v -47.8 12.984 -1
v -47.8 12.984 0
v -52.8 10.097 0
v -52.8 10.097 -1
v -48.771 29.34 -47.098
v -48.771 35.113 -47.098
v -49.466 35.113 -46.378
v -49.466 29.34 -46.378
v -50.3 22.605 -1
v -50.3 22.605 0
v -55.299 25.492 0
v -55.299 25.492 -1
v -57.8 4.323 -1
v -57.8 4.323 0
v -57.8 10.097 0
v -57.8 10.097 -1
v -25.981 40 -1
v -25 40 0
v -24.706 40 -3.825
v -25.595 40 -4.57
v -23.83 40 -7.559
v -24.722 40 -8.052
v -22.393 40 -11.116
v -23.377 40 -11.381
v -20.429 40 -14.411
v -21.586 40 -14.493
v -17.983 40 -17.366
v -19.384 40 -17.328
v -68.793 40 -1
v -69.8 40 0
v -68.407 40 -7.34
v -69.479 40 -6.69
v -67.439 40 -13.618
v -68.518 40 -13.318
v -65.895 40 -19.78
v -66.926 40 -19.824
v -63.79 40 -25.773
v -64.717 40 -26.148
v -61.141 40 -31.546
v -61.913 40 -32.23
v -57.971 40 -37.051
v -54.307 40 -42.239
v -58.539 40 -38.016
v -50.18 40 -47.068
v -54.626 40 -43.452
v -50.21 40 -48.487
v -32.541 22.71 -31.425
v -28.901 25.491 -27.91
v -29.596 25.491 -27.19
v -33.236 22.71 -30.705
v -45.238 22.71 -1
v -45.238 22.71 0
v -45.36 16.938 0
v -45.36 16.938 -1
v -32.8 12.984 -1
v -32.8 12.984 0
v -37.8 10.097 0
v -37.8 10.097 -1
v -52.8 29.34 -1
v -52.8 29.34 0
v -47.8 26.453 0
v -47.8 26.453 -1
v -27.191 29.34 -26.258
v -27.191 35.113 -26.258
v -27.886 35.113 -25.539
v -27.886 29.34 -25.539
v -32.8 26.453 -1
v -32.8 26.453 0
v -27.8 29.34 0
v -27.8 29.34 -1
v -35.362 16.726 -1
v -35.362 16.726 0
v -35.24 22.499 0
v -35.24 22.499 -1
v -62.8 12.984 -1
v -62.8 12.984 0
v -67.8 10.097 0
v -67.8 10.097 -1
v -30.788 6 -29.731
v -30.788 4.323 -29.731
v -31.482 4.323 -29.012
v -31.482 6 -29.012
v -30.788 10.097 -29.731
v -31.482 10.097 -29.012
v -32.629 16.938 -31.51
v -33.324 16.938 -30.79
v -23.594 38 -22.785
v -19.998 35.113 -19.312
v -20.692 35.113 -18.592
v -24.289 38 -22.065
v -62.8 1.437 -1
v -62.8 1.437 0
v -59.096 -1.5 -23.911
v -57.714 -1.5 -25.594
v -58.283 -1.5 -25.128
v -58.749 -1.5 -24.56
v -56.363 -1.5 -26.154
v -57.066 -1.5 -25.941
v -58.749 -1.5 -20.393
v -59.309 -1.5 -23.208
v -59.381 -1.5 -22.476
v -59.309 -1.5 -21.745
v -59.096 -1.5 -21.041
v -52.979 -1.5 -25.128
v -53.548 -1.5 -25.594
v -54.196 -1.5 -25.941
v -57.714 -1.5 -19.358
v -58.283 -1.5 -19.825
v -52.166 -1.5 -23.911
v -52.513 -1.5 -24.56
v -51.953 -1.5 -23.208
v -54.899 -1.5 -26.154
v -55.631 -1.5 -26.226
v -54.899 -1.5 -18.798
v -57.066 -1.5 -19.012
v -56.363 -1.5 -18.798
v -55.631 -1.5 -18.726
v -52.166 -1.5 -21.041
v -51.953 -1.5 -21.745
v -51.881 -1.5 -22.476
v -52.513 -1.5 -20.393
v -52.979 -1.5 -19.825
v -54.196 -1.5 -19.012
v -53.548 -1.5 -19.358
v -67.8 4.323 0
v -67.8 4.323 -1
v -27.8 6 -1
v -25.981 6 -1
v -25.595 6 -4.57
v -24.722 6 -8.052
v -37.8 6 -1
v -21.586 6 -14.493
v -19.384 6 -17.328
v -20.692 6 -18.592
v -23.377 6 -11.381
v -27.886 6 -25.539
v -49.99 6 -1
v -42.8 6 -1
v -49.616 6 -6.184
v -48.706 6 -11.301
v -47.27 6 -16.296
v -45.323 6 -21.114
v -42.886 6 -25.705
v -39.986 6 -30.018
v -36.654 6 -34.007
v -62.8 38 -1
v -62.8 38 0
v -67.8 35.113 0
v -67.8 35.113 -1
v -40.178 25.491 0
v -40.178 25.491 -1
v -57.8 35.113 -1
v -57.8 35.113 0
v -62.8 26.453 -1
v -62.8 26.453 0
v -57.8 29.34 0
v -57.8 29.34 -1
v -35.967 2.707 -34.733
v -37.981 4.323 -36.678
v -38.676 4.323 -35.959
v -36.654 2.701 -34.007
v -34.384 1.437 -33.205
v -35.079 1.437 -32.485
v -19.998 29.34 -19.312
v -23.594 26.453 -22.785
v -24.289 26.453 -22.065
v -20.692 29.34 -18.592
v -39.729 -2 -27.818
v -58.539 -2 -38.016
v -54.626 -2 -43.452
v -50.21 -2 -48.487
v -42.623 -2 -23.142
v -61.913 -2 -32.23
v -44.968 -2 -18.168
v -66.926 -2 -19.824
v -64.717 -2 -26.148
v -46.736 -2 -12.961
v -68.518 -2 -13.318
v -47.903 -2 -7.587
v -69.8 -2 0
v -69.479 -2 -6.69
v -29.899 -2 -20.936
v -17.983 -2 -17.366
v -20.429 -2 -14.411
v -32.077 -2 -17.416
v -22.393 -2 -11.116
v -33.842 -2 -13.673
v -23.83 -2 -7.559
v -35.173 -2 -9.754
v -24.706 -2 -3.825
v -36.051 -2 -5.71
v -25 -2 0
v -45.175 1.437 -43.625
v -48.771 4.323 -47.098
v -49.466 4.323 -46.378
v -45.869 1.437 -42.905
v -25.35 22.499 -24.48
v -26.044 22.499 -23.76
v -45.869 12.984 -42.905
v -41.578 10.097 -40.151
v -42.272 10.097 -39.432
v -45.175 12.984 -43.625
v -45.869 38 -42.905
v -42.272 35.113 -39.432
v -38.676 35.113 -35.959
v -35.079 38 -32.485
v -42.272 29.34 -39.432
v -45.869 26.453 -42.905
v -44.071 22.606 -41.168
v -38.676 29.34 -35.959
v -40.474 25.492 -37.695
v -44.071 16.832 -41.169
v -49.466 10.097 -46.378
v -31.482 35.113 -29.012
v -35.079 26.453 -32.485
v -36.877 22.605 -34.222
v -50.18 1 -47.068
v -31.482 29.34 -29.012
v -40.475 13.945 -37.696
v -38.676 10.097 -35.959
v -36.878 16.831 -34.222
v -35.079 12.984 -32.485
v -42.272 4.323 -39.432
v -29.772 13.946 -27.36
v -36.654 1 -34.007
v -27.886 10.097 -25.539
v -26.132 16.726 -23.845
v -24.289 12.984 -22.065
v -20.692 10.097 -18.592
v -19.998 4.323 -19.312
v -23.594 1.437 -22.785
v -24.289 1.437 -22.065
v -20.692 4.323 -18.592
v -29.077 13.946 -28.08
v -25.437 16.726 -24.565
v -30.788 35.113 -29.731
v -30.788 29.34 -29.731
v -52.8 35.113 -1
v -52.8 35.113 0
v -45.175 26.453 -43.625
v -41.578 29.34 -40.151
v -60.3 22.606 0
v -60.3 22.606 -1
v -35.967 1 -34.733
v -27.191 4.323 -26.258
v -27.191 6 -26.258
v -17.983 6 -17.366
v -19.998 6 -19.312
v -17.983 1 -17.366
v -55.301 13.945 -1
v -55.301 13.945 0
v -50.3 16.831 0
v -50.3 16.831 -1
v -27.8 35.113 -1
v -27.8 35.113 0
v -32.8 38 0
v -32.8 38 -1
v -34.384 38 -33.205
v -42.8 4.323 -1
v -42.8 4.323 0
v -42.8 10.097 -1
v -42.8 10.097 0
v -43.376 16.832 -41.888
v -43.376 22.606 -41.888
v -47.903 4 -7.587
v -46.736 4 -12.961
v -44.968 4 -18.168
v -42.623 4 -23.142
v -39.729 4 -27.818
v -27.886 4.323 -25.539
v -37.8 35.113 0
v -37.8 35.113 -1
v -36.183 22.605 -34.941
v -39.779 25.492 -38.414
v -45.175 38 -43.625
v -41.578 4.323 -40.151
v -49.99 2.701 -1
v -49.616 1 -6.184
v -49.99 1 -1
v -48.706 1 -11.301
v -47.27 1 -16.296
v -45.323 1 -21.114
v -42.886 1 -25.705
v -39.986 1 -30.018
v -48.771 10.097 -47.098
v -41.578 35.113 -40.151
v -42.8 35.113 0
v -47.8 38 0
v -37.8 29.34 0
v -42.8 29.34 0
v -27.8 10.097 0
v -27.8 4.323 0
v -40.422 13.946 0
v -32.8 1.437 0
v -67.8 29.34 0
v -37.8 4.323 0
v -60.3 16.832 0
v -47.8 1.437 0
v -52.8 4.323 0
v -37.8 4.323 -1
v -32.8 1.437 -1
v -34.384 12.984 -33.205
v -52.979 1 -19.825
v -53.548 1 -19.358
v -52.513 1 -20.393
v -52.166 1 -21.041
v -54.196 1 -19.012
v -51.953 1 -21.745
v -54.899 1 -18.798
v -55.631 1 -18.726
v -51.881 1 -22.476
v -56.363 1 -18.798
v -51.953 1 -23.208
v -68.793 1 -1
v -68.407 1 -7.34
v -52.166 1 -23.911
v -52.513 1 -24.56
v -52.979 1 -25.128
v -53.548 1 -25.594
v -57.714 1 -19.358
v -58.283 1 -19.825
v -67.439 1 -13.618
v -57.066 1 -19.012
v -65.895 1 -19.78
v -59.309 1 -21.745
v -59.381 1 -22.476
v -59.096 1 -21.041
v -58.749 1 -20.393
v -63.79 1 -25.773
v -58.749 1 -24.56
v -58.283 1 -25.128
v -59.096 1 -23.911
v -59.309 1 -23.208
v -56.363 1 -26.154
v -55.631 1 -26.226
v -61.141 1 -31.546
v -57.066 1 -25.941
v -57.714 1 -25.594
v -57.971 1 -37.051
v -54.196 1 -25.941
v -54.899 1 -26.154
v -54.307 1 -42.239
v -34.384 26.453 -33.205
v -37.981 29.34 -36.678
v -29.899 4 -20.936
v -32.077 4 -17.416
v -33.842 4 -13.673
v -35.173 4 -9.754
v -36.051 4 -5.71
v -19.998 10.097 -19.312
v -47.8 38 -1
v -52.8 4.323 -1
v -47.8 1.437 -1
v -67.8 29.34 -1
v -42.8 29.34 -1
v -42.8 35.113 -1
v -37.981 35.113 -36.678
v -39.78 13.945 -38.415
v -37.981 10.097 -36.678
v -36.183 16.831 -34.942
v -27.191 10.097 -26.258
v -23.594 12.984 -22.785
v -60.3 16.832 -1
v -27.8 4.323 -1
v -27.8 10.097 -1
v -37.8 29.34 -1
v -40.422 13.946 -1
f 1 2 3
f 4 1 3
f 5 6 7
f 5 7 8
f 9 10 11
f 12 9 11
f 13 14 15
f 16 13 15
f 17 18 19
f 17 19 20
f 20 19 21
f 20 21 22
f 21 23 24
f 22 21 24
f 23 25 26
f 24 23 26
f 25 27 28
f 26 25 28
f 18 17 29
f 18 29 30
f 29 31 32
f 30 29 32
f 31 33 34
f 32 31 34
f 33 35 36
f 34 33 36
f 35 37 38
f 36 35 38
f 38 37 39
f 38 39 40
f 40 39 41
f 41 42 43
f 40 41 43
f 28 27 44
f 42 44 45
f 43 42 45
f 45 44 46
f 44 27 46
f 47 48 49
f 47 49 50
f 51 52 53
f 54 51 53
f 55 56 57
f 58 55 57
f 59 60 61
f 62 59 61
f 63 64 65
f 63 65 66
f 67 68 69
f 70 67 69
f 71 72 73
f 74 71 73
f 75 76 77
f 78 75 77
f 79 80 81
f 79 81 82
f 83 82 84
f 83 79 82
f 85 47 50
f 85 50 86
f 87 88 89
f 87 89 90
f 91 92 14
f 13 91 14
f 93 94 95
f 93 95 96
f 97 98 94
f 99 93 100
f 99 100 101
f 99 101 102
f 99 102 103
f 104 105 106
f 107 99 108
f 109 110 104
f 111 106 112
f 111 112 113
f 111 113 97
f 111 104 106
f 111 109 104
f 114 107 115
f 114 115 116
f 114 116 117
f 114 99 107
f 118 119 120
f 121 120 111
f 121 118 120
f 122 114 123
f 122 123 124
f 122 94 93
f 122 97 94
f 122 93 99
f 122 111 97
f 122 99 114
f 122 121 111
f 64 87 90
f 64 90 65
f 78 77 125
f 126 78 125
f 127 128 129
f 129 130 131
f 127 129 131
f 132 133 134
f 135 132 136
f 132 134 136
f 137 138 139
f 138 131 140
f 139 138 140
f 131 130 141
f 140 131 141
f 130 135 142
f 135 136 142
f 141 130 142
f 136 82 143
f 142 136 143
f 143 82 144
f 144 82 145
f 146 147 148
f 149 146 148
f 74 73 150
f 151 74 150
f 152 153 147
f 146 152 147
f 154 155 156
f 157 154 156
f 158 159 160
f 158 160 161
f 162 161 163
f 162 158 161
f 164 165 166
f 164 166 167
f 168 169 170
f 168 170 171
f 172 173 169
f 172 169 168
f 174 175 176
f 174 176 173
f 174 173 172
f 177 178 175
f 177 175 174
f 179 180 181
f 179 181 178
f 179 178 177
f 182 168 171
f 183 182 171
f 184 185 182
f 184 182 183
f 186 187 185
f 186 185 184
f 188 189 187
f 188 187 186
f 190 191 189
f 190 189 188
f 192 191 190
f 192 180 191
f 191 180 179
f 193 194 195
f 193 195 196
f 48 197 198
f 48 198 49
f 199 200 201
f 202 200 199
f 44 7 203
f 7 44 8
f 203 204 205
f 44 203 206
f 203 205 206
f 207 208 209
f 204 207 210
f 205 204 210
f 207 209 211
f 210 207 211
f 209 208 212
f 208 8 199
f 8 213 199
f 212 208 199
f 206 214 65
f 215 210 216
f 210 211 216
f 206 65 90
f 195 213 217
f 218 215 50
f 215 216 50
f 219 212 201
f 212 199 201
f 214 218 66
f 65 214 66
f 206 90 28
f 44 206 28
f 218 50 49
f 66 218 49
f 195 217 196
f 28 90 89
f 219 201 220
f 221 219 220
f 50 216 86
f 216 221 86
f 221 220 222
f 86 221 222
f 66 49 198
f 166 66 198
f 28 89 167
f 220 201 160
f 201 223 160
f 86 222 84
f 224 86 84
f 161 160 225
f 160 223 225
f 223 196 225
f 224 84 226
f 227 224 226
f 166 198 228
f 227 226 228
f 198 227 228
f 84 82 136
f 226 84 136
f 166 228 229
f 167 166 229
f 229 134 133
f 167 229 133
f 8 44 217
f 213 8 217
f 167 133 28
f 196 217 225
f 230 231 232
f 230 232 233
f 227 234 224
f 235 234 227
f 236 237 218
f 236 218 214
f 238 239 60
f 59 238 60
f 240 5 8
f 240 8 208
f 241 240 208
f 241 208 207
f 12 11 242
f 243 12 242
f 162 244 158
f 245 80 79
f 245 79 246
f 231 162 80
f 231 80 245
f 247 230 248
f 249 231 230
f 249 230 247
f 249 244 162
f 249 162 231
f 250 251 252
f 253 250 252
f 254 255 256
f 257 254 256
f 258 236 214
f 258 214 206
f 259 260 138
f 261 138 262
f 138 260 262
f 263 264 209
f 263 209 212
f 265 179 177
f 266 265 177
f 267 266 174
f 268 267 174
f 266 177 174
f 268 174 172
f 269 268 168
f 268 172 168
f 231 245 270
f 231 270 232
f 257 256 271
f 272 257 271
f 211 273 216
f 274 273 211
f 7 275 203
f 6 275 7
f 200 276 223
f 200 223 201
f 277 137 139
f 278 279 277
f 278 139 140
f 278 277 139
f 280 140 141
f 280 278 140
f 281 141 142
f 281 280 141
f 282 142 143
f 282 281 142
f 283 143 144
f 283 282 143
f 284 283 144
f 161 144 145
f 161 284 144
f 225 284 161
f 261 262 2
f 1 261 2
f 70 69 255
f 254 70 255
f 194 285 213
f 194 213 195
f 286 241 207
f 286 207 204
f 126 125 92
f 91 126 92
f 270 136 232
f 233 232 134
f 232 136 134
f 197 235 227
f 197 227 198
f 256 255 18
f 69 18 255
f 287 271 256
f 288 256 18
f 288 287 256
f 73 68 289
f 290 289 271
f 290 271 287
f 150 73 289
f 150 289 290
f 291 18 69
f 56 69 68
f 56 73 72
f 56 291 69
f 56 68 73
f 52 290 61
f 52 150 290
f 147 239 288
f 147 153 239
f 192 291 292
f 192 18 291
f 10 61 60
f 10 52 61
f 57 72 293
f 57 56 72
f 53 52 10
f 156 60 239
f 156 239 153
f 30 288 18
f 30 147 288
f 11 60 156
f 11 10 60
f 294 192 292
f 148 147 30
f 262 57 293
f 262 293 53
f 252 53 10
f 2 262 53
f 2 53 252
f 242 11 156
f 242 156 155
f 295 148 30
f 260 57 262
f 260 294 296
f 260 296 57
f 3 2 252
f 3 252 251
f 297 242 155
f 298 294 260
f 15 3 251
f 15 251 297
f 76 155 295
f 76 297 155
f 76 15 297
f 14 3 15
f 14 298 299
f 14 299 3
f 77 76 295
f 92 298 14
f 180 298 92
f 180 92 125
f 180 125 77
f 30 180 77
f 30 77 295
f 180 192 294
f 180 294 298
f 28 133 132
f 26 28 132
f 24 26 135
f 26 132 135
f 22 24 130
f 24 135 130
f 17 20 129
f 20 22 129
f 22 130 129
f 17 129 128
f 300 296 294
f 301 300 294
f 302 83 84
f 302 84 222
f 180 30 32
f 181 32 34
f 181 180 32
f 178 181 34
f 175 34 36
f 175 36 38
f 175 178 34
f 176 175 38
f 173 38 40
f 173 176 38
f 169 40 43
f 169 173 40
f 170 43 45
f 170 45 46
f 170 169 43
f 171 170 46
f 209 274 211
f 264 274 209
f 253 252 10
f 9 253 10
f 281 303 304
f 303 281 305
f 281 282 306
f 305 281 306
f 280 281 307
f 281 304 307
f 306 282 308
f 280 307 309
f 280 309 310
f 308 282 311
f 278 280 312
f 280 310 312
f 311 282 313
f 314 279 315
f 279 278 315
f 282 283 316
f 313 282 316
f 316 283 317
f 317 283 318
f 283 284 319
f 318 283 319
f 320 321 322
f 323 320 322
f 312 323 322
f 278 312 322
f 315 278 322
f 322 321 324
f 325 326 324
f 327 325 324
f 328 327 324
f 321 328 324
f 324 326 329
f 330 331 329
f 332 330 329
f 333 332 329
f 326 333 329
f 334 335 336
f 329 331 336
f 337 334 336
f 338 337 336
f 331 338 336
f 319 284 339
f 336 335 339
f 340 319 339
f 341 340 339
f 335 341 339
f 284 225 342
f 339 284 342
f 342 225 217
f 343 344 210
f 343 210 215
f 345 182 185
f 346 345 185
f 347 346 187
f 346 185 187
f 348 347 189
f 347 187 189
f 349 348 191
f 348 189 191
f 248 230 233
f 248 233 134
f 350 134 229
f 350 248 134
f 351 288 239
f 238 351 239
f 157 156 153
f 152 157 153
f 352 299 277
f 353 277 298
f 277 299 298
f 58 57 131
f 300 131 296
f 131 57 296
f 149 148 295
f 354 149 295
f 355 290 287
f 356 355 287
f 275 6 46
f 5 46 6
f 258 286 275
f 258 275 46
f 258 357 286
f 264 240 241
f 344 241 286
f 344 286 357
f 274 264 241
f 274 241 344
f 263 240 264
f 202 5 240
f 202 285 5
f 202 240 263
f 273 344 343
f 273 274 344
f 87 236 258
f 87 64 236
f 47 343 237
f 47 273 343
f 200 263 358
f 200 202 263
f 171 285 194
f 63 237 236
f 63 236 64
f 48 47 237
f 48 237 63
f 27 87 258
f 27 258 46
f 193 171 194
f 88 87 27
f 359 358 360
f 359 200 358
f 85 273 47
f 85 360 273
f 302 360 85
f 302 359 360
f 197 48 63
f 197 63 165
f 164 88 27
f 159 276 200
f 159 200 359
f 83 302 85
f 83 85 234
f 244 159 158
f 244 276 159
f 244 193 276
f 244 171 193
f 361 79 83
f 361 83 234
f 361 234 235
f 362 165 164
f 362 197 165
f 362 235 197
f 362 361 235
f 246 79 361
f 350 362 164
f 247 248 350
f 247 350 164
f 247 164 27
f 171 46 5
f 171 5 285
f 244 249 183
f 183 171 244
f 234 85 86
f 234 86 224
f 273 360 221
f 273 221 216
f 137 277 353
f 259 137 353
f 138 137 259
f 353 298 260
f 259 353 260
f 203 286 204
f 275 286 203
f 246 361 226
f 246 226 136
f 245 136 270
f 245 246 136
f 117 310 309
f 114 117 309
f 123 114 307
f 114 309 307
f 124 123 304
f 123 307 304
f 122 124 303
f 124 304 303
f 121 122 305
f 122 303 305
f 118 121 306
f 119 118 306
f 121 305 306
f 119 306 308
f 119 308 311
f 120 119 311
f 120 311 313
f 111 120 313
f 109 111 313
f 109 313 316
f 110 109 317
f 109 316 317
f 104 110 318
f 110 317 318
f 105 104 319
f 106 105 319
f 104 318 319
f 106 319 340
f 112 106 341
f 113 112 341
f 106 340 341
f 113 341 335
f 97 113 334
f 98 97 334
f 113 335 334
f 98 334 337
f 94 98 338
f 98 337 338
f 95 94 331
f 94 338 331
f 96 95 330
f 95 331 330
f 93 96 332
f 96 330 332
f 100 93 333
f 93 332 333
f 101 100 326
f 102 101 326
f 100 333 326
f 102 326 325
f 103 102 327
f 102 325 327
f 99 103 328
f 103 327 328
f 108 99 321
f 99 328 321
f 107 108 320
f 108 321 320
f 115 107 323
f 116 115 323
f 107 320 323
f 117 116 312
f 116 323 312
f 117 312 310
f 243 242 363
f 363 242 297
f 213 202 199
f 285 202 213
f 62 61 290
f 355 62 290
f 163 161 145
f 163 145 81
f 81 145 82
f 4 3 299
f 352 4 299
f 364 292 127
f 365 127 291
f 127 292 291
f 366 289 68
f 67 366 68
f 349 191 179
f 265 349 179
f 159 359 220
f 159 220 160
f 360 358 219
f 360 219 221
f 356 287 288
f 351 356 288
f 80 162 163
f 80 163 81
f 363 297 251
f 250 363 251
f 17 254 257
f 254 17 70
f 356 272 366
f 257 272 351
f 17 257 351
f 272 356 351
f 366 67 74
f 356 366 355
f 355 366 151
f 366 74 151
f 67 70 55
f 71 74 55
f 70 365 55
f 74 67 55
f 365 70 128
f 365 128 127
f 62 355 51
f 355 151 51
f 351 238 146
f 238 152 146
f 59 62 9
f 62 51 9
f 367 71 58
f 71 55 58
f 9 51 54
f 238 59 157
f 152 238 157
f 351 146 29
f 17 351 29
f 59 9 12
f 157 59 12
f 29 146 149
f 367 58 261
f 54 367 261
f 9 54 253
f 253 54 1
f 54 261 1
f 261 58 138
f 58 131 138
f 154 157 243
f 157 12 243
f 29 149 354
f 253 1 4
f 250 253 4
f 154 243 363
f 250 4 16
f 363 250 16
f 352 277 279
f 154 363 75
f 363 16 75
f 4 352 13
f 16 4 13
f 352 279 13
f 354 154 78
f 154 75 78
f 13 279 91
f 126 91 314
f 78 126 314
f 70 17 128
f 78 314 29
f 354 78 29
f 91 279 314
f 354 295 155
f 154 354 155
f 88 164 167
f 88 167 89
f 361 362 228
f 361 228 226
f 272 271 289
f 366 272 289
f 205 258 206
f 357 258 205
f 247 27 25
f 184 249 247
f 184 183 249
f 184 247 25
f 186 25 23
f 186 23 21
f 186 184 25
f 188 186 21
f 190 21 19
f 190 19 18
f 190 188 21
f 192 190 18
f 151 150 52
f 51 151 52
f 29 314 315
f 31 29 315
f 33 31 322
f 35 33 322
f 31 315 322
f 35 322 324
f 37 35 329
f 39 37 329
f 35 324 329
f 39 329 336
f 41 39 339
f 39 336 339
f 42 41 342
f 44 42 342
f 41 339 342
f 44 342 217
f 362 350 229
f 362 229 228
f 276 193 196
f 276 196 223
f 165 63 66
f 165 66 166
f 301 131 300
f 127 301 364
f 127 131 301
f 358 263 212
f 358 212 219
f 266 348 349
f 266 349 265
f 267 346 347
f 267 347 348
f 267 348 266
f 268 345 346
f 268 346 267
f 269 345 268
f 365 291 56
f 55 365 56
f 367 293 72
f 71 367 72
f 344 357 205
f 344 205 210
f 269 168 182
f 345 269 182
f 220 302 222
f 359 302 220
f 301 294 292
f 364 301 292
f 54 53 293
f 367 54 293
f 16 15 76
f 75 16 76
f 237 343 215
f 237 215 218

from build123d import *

# Parameters (mm, degrees)
SALIENTE_EXTRUIR1_DEPTH = 40
VACIADO1_T              = -1
SALIENTE_EXTRUIR3_START = 2
SALIENTE_EXTRUIR3_DEPTH = 2
CROQUIS5_R              = 3.75
CORTAR_EXTRUIR2_DEPTH   = 2.5
SALIENTE_EXTRUIR5_DEPTH = 5
CORTAR_EXTRUIR3_DEPTH   = 6
CORTAR_EXTRUIR4_DEPTH   = 1
CORTAR_EXTRUIR5_DEPTH   = 1


with BuildPart() as part:
    # Croquis1 → Saliente-Extruir1 (new body)
    with BuildSketch(Plane(origin=(0, 0, 0), x_dir=(1, 0, 0), z_dir=(0, 1, 0))):
        with BuildLine():
            Line((-25, 0), (-69.8, 0))
            ThreePointArc((-69.8, 0), (-64.717433049, 26.14754022), (-50.209918064, 48.487154258))
            Line((-50.209918064, 48.487154258), (-17.983495008, 17.366459261))
            ThreePointArc((-17.983495008, 17.366459261), (-23.179596364, 9.365164835), (-25, 0))
        make_face()
    extrude(amount=SALIENTE_EXTRUIR1_DEPTH)

    # Vaciado1
    vaciado1_openings = [part.faces().sort_by_distance(p)[0] for p in [
        (-46.068338787, 40, -18.61281705),
    ]]
    offset(amount=VACIADO1_T, openings=vaciado1_openings, kind=Kind.INTERSECTION)

    # Croquis4 → Saliente-Extruir3 (add)
    with BuildSketch(Plane.XZ.offset(SALIENTE_EXTRUIR3_START)):
        with BuildLine():
            Line((-25, 0), (-69.8, 0))
            ThreePointArc((-69.8, 0), (-64.717433049, -26.14754022), (-50.209918064, -48.487154258))
            Line((-50.209918064, -48.487154258), (-17.983495008, -17.366459261))
            ThreePointArc((-17.983495008, -17.366459261), (-23.179596364, -9.365164835), (-25, 0))
        make_face()
    extrude(amount=-SALIENTE_EXTRUIR3_DEPTH)

    # Croquis5 → Cortar-Extruir2 (cut)
    with BuildSketch(Plane(origin=(0, 1, 0), x_dir=(1, 0, 0), z_dir=(0, 1, 0))):
        with Locations(Location((-55.631031274, 22.476395605, 0), (0, 0, 270))):
            Circle(CROQUIS5_R)
    extrude(amount=-CORTAR_EXTRUIR2_DEPTH, mode=Mode.SUBTRACT)

    # Croquis6 → Saliente-Extruir5 (add)
    with BuildSketch(Plane(origin=(0, 1, 0), x_dir=(1, 0, 0), z_dir=(0, 1, 0))):
        with BuildLine():
            Line((-25, 0), (-50, 0))
            ThreePointArc((-50, 0), (-46.359192728, 18.730329671), (-35.966990017, 34.732918523))
            Line((-35.966990017, 34.732918523), (-17.983495008, 17.366459261))
            ThreePointArc((-17.983495008, 17.366459261), (-23.179596364, 9.365164835), (-25, 0))
        make_face()
    extrude(amount=SALIENTE_EXTRUIR5_DEPTH)

    # Croquis2 → Cortar-Extruir3 (cut)
    with BuildSketch(Plane(origin=(0, -2, 0), x_dir=(1, 0, 0), z_dir=(0, 1, 0))):
        with BuildLine():
            Line((-39.728874148, 27.818457163), (-29.899049617, 20.935539927))
            ThreePointArc((-29.899049617, 20.935539927), (-33.842210692, 13.67314066), (-36.050624432, 5.709857974))
            Line((-36.050624432, 5.709857974), (-47.902884519, 7.587071554))
            ThreePointArc((-47.902884519, 7.587071554), (-44.968416946, 18.168419781), (-39.728874148, 27.818457163))
        make_face()
    extrude(amount=CORTAR_EXTRUIR3_DEPTH, mode=Mode.SUBTRACT)

    # Croquis7 → Cortar-Extruir4 (cut)
    with BuildSketch(Plane.XY):
        Polygon((-62.8, 38), (-67.8, 35.113248654), (-67.8, 29.339745962), (-62.8, 26.452994616), (-57.8, 29.339745962), (-57.8, 35.113248654), align=None)
        Polygon((-47.8, 38), (-52.8, 35.113248654), (-52.8, 29.339745962), (-47.8, 26.452994616), (-42.8, 29.339745962), (-42.8, 35.113248654), align=None)
        Polygon((-32.8, 38), (-37.8, 35.113248654), (-37.8, 29.339745962), (-32.8, 26.452994616), (-27.8, 29.339745962), (-27.8, 35.113248654), align=None)
        Polygon((-47.8, 12.983724512), (-52.8, 10.096973166), (-52.8, 4.323470474), (-47.8, 1.436719129), (-42.8, 4.323470474), (-42.8, 10.096973166), align=None)
        Polygon((-32.8, 12.983724512), (-37.8, 10.096973166), (-37.8, 4.323470474), (-32.8, 1.436719129), (-27.8, 4.323470474), (-27.8, 10.096973166), align=None)
        Polygon((-62.8, 12.983724512), (-67.8, 10.096973166), (-67.8, 4.323470474), (-62.8, 1.436719129), (-57.8, 4.323470474), (-57.8, 10.096973166), align=None)
        Polygon((-55.299341949, 25.491862219), (-60.299670942, 22.605680781), (-60.300328993, 16.832178126), (-55.300658051, 13.94485691), (-50.300329058, 16.831038348), (-50.299671007, 22.604541002), align=None)
        Polygon((-40.177782617, 25.490568521), (-45.237770901, 22.710307401), (-45.359988284, 16.938098444), (-40.422217383, 13.946150607), (-35.362229099, 16.726411727), (-35.240011716, 22.498620684), align=None)
    extrude(amount=-CORTAR_EXTRUIR4_DEPTH, mode=Mode.SUBTRACT)

    # Croquis8 → Cortar-Extruir5 (cut)
    with BuildSketch(Plane(origin=(0, 0, 0), x_dir=(0.7193398003386502, 0, 0.6946583704589984), z_dir=(-0.6946583704589984, 0, 0.7193398003386502))):
        Polygon((-62.8, 38), (-67.8, 35.113248654), (-67.8, 29.339745962), (-62.8, 26.452994616), (-57.8, 29.339745962), (-57.8, 35.113248654), align=None)
        Polygon((-47.8, 38), (-52.8, 35.113248654), (-52.8, 29.339745962), (-47.8, 26.452994616), (-42.8, 29.339745962), (-42.8, 35.113248654), align=None)
        Polygon((-32.8, 38), (-37.8, 35.113248654), (-37.8, 29.339745962), (-32.8, 26.452994616), (-27.8, 29.339745962), (-27.8, 35.113248654), align=None)
        Polygon((-47.8, 12.983724512), (-52.8, 10.096973166), (-52.8, 4.323470474), (-47.8, 1.436719129), (-42.8, 4.323470474), (-42.8, 10.096973166), align=None)
        Polygon((-32.8, 12.983724512), (-37.8, 10.096973166), (-37.8, 4.323470474), (-32.8, 1.436719129), (-27.8, 4.323470474), (-27.8, 10.096973166), align=None)
        Polygon((-62.8, 12.983724512), (-67.8, 10.096973166), (-67.8, 4.323470474), (-62.8, 1.436719129), (-57.8, 4.323470474), (-57.8, 10.096973166), align=None)
        Polygon((-55.299341949, 25.491862219), (-60.299670942, 22.605680781), (-60.300328993, 16.832178126), (-55.300658051, 13.94485691), (-50.300329058, 16.831038348), (-50.299671007, 22.604541002), align=None)
        Polygon((-40.177782617, 25.490568521), (-45.237770901, 22.710307401), (-45.359988284, 16.938098444), (-40.422217383, 13.946150607), (-35.362229099, 16.726411727), (-35.240011716, 22.498620684), align=None)
    extrude(amount=CORTAR_EXTRUIR5_DEPTH, mode=Mode.SUBTRACT)


solid = part.part
